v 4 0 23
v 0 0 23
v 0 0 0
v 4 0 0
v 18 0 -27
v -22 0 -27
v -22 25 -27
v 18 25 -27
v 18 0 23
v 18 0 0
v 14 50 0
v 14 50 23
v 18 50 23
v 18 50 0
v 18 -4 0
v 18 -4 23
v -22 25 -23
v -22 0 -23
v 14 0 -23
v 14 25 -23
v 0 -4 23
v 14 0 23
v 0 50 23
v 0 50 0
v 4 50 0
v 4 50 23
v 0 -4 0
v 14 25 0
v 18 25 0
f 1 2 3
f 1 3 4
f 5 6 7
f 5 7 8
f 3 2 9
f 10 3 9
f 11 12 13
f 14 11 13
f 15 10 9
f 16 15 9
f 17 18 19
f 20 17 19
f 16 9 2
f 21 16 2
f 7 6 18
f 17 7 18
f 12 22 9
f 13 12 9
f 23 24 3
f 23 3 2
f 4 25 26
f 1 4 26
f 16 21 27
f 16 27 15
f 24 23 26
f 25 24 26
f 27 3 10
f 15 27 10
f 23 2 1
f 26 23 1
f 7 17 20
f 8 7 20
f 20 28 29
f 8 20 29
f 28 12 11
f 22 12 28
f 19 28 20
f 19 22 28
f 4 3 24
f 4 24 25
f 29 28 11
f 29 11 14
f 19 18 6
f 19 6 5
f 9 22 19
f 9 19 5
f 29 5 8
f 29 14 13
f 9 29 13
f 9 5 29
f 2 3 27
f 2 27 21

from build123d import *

# Parameters (mm, degrees)
F0_W     = 4
F0_H     = 23
F1_DEPTH = 50
F0_W_2   = 36
F0_H_2   = 4
F2_DEPTH = 25
F0_W_3   = 10
F3_DEPTH = 4


with BuildPart() as f1:
    # F0 (on Front) → F1 (new body)
    with BuildSketch(Plane.XZ):
        with Locations((2, 11.5)):
            Rectangle(F0_W, F0_H)
        with Locations((16, 11.5)):
            Rectangle(F0_W, F0_H)
    extrude(amount=-F1_DEPTH)

    # F0 (on Front) → F2 (join)
    with BuildSketch(Plane.XZ):
        with Locations((-4, -25)):
            Rectangle(F0_W_2, F0_H_2)
        Polygon((18, 0), (14, 0), (14, -23), (14, -27), (18, -27), align=None)
    extrude(amount=-F2_DEPTH)


with BuildPart() as f3:
    # F0 (on Front) → F3 (new body)
    with BuildSketch(Plane.XZ):
        with Locations((9, 11.5)):
            Rectangle(F0_W_3, F0_H)
        with Locations((2, 11.5)):
            Rectangle(F0_W, F0_H)
        with Locations((16, 11.5)):
            Rectangle(F0_W, F0_H)
    extrude(amount=F3_DEPTH)


solid = Compound([f1.part, f3.part])
